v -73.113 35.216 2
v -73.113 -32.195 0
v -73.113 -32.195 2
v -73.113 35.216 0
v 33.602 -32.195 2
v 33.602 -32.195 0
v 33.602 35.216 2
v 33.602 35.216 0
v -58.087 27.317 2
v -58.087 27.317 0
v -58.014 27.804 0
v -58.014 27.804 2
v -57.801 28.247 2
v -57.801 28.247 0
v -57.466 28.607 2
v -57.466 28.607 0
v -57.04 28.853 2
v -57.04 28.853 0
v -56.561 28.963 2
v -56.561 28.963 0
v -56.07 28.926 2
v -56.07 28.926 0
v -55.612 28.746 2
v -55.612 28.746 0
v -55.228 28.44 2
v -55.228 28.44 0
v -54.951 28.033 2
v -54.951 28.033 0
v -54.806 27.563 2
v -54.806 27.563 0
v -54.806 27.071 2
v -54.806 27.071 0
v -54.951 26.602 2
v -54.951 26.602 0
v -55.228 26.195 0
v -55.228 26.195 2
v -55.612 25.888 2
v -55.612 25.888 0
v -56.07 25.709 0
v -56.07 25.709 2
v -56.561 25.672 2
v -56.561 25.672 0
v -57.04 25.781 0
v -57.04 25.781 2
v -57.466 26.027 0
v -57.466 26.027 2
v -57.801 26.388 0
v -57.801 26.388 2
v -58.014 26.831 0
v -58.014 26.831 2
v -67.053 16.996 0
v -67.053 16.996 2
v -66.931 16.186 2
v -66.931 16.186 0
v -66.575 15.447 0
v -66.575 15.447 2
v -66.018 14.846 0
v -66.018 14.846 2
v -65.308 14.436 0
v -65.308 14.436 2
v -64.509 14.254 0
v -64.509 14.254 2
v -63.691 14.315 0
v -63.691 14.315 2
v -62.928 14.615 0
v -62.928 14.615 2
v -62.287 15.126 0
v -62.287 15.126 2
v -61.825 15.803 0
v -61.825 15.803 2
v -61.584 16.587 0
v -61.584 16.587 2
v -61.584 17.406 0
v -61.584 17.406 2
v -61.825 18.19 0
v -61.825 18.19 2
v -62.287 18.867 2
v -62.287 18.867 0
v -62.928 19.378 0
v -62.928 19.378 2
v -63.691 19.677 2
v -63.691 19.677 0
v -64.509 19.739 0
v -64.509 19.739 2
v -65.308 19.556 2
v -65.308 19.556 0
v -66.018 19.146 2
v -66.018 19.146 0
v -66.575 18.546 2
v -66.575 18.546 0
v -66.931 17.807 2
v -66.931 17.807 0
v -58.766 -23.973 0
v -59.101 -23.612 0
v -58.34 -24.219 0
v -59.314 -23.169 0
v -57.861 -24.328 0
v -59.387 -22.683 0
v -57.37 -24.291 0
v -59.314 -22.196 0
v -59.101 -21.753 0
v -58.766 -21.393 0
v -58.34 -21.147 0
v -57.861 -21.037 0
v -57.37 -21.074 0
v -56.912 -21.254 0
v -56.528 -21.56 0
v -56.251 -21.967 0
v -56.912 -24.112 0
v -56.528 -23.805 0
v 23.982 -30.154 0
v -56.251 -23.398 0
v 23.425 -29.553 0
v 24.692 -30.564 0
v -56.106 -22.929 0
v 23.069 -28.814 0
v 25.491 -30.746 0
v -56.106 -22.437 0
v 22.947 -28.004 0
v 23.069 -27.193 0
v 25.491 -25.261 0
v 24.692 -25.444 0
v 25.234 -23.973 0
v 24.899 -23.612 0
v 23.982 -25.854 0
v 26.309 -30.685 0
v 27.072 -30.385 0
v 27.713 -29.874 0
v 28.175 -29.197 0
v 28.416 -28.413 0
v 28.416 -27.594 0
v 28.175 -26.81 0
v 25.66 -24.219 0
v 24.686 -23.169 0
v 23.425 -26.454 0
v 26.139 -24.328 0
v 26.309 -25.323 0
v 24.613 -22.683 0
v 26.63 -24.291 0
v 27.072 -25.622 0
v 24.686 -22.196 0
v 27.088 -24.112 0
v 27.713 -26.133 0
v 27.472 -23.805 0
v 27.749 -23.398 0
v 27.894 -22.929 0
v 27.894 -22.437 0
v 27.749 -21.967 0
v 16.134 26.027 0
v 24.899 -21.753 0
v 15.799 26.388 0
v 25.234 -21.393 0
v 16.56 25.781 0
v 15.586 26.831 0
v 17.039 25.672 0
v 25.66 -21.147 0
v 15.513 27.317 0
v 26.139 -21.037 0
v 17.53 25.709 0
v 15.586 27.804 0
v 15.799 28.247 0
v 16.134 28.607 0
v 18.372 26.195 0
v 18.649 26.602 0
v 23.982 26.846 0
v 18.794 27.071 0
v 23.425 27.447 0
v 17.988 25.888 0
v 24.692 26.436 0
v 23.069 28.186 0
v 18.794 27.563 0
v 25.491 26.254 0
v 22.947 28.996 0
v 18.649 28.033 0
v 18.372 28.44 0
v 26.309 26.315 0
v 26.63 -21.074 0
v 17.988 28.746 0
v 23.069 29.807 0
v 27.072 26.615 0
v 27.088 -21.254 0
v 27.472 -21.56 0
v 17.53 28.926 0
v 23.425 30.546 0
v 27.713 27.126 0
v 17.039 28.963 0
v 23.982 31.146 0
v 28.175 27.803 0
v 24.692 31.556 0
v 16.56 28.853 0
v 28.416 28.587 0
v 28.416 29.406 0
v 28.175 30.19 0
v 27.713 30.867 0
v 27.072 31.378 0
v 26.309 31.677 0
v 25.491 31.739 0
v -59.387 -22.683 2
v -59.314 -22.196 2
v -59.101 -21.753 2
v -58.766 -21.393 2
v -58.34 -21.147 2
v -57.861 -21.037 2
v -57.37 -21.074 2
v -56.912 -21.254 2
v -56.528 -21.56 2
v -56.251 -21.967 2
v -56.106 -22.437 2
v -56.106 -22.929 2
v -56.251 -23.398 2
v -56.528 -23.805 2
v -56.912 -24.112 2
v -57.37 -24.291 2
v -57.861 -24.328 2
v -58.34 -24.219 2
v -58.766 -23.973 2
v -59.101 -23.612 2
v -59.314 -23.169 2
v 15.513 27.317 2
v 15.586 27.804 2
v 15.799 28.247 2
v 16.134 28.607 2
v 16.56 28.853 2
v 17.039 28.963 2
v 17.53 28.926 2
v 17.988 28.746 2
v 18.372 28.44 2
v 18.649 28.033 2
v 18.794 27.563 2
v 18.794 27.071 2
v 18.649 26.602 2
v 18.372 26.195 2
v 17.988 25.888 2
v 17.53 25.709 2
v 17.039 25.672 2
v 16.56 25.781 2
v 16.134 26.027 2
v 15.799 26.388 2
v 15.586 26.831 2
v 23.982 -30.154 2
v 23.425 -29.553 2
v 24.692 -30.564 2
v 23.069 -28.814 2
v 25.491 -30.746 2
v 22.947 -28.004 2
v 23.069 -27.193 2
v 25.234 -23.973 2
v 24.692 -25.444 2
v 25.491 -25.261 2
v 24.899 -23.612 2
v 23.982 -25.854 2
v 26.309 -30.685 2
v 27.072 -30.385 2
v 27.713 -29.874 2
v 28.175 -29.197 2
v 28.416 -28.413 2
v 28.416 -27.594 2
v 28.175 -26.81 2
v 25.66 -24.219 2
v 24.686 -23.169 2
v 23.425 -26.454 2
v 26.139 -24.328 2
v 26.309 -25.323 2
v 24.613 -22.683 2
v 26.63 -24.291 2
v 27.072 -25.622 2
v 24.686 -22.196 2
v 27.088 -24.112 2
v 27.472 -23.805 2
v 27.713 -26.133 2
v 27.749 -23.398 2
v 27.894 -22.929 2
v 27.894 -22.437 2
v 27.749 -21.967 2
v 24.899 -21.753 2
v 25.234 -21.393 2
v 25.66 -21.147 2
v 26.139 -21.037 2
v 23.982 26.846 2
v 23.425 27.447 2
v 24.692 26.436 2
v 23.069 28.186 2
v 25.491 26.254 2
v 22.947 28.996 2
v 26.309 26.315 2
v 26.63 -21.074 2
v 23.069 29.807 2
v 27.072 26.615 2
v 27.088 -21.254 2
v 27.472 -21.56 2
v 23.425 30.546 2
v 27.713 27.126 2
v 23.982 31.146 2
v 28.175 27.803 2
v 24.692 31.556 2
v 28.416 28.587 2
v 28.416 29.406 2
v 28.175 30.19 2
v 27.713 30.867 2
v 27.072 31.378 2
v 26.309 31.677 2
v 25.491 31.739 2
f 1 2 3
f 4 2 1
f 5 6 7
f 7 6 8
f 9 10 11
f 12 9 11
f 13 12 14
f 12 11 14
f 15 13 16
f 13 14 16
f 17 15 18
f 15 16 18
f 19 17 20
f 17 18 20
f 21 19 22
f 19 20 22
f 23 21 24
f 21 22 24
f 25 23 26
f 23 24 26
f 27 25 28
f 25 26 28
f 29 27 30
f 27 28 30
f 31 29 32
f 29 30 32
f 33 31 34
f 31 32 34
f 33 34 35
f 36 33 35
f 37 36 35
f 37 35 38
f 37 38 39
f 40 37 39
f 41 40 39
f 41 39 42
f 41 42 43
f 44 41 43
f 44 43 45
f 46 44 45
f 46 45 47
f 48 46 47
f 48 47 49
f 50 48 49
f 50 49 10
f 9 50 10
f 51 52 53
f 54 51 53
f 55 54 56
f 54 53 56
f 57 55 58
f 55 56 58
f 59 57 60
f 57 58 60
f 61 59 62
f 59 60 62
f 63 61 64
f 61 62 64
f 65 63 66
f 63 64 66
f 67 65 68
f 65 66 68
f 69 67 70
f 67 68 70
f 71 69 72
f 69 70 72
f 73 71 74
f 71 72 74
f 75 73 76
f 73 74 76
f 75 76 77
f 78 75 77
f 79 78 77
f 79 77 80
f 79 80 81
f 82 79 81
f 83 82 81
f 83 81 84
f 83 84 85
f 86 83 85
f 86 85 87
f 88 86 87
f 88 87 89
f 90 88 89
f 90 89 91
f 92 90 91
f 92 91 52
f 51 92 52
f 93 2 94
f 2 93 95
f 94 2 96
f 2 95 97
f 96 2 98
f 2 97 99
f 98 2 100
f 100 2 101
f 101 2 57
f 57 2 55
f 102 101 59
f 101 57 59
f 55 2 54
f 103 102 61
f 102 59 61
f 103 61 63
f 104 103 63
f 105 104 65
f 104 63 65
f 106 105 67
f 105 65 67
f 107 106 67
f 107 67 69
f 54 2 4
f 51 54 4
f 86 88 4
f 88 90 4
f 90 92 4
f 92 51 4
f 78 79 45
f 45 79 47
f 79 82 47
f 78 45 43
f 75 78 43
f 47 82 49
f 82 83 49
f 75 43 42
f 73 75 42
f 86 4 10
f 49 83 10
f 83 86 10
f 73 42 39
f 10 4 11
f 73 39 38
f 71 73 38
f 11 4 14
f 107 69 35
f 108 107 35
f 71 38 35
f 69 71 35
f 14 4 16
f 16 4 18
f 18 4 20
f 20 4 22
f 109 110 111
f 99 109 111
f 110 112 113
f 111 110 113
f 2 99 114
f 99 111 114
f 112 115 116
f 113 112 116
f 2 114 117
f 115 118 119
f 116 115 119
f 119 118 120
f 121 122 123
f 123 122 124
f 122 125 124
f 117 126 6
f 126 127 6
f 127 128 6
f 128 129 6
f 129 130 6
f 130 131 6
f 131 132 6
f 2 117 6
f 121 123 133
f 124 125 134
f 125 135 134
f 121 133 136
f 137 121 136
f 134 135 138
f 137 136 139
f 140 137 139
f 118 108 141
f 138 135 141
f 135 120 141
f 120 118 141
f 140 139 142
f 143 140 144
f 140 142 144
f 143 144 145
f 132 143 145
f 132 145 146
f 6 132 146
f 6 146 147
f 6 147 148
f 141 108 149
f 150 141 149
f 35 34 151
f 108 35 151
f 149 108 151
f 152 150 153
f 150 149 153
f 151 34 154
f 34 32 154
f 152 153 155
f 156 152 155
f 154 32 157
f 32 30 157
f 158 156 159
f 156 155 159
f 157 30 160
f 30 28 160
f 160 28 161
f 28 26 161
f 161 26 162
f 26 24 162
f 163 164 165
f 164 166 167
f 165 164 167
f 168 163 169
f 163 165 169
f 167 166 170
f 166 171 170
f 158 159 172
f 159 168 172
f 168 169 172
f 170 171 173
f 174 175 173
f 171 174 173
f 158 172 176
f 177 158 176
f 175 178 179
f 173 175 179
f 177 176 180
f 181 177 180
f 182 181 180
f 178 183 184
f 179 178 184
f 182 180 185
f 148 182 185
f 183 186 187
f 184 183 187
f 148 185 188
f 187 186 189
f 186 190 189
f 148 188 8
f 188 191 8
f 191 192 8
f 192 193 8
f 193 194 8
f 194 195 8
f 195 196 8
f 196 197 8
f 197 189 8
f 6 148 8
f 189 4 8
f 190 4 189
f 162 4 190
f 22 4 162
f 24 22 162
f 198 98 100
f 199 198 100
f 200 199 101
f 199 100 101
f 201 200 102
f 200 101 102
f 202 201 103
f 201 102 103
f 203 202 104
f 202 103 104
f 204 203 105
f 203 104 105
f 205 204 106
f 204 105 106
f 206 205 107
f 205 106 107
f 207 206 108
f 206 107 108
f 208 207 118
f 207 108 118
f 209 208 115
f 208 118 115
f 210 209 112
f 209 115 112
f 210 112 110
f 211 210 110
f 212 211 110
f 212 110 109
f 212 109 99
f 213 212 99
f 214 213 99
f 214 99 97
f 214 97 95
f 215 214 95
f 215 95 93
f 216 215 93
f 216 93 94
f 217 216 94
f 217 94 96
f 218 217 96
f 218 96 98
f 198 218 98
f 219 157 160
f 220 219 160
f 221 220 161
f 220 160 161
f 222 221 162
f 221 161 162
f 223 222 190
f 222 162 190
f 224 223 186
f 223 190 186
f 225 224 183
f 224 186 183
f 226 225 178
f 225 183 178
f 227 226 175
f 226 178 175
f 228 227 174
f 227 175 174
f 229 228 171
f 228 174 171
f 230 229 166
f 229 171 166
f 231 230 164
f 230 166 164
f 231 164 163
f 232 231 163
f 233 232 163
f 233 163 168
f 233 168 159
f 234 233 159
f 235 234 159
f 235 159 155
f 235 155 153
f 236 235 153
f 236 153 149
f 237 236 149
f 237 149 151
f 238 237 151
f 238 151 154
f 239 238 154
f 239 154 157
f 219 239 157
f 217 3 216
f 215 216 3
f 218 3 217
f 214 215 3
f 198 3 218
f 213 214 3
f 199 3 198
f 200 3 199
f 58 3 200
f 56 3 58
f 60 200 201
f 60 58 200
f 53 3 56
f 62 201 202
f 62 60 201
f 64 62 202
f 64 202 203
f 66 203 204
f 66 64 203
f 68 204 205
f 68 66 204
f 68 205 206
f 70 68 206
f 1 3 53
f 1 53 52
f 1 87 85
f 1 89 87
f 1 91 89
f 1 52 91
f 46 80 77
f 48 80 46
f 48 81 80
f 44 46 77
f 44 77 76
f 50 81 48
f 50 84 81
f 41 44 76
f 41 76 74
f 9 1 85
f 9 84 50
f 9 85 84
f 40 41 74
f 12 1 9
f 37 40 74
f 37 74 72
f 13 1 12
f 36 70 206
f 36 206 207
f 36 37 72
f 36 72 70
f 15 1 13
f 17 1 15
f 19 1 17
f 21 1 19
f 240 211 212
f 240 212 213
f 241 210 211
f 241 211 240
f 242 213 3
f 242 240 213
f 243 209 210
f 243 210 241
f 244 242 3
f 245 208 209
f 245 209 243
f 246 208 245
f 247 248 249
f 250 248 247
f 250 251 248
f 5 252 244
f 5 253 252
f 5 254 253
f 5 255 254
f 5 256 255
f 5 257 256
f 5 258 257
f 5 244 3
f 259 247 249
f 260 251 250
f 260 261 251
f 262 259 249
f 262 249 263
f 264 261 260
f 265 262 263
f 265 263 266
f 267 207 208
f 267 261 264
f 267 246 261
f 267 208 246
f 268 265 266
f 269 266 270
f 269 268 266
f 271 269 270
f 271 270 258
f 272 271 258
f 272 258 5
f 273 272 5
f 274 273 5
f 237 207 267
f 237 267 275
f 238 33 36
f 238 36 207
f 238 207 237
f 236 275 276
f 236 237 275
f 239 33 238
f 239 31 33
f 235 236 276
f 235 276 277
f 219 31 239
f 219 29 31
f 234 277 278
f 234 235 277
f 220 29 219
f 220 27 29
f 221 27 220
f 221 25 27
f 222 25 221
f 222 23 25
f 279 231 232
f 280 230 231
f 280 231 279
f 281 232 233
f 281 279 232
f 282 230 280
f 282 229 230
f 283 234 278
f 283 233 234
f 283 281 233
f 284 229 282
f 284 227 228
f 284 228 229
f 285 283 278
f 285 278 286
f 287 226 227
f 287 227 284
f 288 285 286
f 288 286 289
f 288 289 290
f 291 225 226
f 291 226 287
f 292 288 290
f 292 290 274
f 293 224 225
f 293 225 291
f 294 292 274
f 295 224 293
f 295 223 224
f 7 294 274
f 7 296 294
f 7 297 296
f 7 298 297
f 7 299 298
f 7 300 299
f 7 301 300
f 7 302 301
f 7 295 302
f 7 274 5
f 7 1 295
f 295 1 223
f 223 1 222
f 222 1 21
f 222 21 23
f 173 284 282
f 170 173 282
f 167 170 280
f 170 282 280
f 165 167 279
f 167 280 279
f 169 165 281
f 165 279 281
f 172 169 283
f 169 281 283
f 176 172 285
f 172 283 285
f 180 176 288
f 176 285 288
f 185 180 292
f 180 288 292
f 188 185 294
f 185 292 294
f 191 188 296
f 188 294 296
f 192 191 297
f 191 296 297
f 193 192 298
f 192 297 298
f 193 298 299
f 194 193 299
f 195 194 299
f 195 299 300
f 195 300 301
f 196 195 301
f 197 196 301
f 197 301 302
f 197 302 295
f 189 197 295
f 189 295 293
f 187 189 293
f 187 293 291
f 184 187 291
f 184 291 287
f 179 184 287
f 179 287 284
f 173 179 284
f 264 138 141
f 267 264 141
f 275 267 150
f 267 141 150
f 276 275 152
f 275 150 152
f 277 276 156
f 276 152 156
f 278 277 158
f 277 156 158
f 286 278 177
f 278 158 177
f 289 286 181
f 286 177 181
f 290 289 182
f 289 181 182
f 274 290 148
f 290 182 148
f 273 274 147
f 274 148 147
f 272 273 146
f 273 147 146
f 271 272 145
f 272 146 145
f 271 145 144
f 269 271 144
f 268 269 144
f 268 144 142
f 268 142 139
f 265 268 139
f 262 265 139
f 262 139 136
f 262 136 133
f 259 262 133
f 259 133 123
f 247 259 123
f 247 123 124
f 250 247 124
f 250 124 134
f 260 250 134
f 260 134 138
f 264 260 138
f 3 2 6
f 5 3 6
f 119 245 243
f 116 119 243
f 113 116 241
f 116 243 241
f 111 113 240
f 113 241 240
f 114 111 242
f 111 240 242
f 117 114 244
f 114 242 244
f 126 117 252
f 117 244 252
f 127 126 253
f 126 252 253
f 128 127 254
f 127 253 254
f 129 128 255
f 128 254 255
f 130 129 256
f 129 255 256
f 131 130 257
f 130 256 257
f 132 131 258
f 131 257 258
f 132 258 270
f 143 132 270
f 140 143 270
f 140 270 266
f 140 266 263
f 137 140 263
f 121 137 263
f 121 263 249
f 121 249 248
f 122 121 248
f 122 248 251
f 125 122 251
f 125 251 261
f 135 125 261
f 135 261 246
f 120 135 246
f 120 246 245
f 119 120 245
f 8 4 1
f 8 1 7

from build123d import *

# Parameters (mm, degrees)
F0_W     = 106.7152023315
F0_H     = 67.4116164446
F1_DEPTH = 2
F2_D     = 5.5
F2_DEPTH = 18
F2_TIP   = 1.6523667023
F4_D     = 3.3
F4_DEPTH = 18
F4_TIP   = 0.9914200214


with BuildPart() as f1:
    # F0 (on Top) → F1 (new body)
    with BuildSketch(Plane.XY):
        with Locations((-19.7555795312, 1.5103928745)):
            Rectangle(F0_W, F0_H)
    extrude(amount=F1_DEPTH)

    # F2
    with Locations(Plane(origin=(0, 0, 0), x_dir=(1, 0, 0), z_dir=(0, 0, -1))):
        with Locations((-64.3030628562, -16.9964022934), (25.6969371438, -28.9964022934), (25.6969371438, 28.0035977066)):
            Hole(F2_D / 2, depth=F2_DEPTH)
            with Locations((0, 0, -(F2_DEPTH + F2_TIP / 2))):  # 118° drill point
                Cone(0, F2_D / 2, F2_TIP, mode=Mode.SUBTRACT)

    # F4
    with Locations(Plane.XY.offset(2)):
        with Locations((-56.4374391407, 27.3174114525), (17.1625608593, 27.3174114525), (-57.7374391407, -22.6825885475), (26.2625608593, -22.6825885475)):
            Hole(F4_D / 2, depth=F4_DEPTH)
            with Locations((0, 0, -(F4_DEPTH + F4_TIP / 2))):  # 118° drill point
                Cone(0, F4_D / 2, F4_TIP, mode=Mode.SUBTRACT)


solid = f1.part
